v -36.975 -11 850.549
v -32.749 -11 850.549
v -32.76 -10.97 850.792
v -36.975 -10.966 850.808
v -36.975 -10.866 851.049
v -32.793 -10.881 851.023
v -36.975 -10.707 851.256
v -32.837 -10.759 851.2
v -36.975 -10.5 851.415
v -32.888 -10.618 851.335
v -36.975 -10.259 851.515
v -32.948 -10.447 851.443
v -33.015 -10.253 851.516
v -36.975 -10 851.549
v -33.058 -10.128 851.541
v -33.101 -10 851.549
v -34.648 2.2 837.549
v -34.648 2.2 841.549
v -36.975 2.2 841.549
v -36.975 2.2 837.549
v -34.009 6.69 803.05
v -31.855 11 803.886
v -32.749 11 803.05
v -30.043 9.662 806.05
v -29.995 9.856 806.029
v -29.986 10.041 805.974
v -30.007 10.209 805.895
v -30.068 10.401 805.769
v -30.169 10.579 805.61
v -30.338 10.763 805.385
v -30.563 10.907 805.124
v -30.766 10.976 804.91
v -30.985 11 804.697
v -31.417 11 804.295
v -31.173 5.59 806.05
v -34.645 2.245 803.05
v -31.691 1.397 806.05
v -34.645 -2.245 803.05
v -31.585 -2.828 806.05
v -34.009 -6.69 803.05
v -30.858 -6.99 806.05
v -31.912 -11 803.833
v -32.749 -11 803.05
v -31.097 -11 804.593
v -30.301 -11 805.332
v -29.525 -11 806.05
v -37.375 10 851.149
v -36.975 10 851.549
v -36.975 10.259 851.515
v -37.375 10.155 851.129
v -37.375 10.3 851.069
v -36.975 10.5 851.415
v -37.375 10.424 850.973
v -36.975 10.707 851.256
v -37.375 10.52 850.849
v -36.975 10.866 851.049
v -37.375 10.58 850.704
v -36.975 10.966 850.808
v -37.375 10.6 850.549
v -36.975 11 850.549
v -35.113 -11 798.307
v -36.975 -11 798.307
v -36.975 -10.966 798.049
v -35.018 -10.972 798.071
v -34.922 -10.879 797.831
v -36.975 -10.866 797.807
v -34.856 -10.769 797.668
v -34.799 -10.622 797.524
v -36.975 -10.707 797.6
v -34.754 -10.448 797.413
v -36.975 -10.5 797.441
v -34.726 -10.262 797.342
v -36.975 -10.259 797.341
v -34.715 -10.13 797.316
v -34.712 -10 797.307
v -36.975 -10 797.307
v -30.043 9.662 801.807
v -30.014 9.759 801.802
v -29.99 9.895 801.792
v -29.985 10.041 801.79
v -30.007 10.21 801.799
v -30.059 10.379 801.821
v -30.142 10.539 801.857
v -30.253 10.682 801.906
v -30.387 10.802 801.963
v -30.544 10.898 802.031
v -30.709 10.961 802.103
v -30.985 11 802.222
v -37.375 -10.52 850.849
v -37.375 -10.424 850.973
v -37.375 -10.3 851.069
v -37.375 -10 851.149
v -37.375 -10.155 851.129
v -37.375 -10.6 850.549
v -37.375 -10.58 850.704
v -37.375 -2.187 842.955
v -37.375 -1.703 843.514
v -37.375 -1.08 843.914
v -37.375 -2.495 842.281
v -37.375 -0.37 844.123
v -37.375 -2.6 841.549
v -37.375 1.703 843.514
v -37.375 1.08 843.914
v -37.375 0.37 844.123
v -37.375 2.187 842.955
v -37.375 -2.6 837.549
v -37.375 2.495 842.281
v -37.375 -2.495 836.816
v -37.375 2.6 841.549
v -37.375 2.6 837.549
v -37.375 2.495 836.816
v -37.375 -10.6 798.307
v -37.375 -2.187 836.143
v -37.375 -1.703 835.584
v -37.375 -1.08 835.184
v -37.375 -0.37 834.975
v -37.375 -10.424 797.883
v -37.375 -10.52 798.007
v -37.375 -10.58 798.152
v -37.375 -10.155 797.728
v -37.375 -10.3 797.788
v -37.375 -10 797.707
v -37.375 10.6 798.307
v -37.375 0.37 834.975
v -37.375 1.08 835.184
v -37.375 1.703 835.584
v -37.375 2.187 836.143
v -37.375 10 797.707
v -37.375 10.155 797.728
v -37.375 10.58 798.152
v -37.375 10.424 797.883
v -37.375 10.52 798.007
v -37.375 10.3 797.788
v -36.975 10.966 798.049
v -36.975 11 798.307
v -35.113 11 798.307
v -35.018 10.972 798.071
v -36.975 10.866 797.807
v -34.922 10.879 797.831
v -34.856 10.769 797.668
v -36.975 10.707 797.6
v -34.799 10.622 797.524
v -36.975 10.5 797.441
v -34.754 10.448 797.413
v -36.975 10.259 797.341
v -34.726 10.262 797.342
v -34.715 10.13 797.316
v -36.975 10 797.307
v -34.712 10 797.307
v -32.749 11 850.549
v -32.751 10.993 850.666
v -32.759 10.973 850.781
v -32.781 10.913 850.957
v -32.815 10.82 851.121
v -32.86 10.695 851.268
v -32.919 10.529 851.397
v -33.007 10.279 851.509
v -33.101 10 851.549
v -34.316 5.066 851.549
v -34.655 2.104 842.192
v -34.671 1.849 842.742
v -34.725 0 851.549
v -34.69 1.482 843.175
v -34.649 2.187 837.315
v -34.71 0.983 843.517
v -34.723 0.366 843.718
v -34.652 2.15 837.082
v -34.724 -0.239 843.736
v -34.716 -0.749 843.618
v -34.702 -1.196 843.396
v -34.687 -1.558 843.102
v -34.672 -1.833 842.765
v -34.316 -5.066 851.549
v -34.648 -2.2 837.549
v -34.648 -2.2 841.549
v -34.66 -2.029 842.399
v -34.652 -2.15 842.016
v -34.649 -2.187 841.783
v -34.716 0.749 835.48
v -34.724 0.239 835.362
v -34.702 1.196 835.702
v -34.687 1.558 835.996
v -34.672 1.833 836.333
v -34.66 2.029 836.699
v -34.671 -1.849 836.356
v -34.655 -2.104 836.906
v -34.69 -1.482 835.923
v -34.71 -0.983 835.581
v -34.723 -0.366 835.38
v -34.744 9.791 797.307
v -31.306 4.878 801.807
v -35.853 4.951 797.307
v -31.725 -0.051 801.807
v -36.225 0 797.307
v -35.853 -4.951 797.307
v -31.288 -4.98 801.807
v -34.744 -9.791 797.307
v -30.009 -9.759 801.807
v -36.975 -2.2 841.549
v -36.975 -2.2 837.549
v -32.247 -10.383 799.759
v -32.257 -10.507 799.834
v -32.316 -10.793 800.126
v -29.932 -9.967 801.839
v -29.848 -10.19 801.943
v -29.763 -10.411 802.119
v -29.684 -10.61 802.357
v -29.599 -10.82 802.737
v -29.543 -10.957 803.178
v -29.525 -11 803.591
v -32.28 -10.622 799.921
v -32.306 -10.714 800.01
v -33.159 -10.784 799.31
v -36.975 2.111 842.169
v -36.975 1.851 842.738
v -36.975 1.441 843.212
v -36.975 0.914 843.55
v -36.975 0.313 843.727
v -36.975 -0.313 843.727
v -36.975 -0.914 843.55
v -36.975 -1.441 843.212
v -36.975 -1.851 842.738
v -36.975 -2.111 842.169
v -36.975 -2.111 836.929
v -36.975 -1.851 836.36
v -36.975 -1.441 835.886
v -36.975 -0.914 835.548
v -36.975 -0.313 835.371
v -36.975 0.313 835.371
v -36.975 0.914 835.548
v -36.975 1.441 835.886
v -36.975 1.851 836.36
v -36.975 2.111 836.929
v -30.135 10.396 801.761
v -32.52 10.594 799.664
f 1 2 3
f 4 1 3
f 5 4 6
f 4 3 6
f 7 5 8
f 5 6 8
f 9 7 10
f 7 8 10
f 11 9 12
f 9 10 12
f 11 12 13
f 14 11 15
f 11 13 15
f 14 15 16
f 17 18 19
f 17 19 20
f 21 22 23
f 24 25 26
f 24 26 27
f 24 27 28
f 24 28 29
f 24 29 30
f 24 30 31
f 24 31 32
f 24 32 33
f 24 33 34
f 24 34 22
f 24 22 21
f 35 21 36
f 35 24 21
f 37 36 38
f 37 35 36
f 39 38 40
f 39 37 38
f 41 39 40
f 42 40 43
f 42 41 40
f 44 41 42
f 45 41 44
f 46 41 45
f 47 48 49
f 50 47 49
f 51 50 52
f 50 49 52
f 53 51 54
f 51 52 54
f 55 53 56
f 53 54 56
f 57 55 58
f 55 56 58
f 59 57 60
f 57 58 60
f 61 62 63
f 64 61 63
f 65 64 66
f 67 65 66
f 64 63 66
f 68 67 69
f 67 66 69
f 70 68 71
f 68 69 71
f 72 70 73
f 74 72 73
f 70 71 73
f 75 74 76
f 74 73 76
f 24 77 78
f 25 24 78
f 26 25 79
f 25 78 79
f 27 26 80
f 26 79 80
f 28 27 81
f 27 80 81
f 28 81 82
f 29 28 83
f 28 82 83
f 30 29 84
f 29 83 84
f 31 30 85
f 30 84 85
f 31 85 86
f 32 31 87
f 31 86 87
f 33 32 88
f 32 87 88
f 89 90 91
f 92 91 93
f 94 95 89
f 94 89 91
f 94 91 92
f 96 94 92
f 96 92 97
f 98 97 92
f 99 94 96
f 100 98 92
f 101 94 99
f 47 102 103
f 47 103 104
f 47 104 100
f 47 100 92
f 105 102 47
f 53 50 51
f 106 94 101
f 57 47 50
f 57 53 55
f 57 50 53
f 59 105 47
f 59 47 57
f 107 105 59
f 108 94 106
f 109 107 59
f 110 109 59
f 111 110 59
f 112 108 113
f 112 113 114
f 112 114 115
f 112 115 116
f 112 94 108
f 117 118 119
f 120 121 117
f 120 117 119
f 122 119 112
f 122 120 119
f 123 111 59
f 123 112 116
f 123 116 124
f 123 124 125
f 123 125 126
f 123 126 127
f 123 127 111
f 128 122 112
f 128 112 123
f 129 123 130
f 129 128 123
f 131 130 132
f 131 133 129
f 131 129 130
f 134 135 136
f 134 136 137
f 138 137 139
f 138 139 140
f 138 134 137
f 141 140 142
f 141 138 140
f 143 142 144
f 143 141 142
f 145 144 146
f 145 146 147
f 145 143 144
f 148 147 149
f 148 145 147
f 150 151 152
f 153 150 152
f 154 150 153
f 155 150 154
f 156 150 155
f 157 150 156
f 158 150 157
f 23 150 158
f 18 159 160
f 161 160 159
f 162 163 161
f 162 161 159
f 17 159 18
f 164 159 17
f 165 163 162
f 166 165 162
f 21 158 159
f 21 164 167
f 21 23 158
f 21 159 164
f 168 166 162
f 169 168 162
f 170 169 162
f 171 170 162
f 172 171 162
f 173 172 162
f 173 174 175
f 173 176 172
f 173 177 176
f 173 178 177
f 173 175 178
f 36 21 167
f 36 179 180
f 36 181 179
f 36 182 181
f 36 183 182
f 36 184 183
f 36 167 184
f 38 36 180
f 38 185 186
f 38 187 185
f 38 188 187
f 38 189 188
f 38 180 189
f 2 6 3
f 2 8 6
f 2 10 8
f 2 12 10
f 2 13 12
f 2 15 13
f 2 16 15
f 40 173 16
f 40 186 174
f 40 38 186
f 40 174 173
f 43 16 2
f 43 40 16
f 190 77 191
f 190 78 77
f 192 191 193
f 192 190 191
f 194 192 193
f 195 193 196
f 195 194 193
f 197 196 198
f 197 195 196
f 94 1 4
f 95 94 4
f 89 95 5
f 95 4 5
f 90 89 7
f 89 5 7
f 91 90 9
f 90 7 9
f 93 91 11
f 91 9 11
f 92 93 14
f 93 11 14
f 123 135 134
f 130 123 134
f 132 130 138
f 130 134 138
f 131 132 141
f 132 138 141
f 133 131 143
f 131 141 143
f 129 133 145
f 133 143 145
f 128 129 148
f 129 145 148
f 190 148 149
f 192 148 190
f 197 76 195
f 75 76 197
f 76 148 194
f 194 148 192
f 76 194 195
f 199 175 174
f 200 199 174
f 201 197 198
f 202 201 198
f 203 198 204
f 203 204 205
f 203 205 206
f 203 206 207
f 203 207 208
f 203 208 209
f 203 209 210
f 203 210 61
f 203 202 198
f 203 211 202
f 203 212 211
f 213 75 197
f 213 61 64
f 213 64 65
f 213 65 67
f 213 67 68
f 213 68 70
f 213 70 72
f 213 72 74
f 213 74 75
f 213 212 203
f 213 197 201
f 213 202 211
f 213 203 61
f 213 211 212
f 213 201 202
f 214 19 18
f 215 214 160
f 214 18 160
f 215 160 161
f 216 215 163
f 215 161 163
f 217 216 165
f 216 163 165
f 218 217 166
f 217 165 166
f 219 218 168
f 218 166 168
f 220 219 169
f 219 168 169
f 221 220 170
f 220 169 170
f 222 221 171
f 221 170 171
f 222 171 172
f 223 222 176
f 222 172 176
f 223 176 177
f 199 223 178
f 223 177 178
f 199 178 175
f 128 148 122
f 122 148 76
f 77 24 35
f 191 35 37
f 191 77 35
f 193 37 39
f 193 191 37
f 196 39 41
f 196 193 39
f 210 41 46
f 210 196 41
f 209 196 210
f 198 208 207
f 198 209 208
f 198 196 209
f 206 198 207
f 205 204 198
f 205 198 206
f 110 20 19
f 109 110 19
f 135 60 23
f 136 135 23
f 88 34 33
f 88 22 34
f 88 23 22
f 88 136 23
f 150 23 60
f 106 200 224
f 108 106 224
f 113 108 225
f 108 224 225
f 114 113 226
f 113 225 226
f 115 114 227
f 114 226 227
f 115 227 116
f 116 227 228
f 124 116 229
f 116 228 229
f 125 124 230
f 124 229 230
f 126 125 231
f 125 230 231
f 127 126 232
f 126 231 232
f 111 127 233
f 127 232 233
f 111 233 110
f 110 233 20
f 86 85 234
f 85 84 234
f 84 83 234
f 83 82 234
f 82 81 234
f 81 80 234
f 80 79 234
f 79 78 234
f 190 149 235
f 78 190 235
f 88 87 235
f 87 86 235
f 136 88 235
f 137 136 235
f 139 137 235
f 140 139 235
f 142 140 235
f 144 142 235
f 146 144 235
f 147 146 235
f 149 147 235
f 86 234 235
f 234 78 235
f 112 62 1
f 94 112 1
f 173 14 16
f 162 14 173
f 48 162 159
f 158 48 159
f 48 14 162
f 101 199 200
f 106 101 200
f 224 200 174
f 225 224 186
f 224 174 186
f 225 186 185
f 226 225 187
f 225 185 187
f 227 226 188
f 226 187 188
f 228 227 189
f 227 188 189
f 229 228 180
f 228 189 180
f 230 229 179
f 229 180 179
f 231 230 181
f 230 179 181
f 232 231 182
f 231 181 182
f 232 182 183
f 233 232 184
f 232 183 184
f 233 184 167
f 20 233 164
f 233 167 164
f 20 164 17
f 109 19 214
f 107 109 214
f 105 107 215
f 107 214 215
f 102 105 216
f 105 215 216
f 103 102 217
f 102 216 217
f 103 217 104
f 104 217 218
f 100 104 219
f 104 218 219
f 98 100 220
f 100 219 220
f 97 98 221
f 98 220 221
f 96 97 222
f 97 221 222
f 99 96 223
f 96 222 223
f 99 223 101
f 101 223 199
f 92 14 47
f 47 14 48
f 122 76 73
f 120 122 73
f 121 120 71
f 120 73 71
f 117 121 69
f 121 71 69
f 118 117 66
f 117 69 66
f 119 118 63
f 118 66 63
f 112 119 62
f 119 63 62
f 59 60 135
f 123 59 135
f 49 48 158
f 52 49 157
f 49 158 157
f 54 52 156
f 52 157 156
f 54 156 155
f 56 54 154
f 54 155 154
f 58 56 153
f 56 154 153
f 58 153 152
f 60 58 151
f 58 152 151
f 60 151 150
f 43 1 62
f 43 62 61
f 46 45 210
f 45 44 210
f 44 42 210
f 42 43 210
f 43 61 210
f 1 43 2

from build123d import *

# Parameters (mm, degrees)
BOX_W           = 9
BOX_H           = 22
BOX_DEPTH       = 56.284271
POCKET077_DEPTH = 34.251
FILLET010_R     = 1
CHAMFER001_SIZE = 0.4


with BuildPart() as part:
    # Box → Box (join)
    with BuildSketch(Plane(origin=(-34.25, -11, -59.534271), x_dir=(1, 0, 0), z_dir=(0, 0, 1))):
        with Locations((4.5, 11)):
            Rectangle(BOX_W, BOX_H)
    extrude(amount=BOX_DEPTH)

    # Sketch136 → Pocket077 (cut, through all)
    with BuildSketch(Plane.YZ):
        with BuildLine():
            ThreePointArc((2.2, -13.25), (0, -11.05), (-2.2, -13.25))
            Line((-2.2, -13.25), (-2.2, -17.25))
            ThreePointArc((-2.2, -17.25), (0, -19.45), (2.2, -17.25))
            Line((2.2, -13.25), (2.2, -17.25))
        make_face()
    extrude(amount=-POCKET077_DEPTH, mode=Mode.SUBTRACT)

    # Sketch228 → Groove003 (revolve, cut)
    with BuildSketch(Plane.XZ):
        Polygon((-31.6, 0), (-31.6, -51.74899), (-28.6, -48.74899), (-28.6, -52.991631), (-33.1, -57.491631), (-36.1, -57.491631), (-36.1, -60.74899), (-19.6, -60.74899), (-19.6, 0), align=None)
    revolve(axis=Axis((0, 0, 0), (0, 0, 1)), mode=Mode.SUBTRACT)

    # Fillet010
    fillet010_edges = [part.edges().sort_by_distance(p)[0] for p in [
        (-32.734372, -11, -57.491631),
        (-28.815375, -11, -55.235201),
        (-32.734372, 11, -57.491631),
        (-28.815375, 11, -55.235201),
        (-26.4, 11, -50.87031),
        (-31.93682, 11, -3.25),
        (-31.93682, -11, -3.25),
    ]]
    fillet(fillet010_edges, radius=FILLET010_R)

    # Chamfer001
    chamfer001_edges = [part.edges().sort_by_distance(p)[0] for p in [
        (-34.25, 0, -57.491631),
        (-34.25, 10.707107, -57.198737),
        (-34.25, 11, -30.370815),
        (-34.25, 10.707107, -3.542893),
        (-34.25, 0, -3.25),
        (-34.25, -10.707107, -3.542893),
        (-34.25, -11, -30.370815),
        (-34.25, -10.707107, -57.198737),
        (-34.25, 0, -19.45),
        (-34.25, 2.2, -15.25),
        (-34.25, 0, -11.05),
        (-34.25, -2.2, -15.25),
    ]]
    chamfer(chamfer001_edges, length=CHAMFER001_SIZE)


with BuildPart() as part_1:
    # Body022028 placement: moved
    add(part.part.moved(Location((-3.125, 0, 854.79899))))


solid = part_1.part
